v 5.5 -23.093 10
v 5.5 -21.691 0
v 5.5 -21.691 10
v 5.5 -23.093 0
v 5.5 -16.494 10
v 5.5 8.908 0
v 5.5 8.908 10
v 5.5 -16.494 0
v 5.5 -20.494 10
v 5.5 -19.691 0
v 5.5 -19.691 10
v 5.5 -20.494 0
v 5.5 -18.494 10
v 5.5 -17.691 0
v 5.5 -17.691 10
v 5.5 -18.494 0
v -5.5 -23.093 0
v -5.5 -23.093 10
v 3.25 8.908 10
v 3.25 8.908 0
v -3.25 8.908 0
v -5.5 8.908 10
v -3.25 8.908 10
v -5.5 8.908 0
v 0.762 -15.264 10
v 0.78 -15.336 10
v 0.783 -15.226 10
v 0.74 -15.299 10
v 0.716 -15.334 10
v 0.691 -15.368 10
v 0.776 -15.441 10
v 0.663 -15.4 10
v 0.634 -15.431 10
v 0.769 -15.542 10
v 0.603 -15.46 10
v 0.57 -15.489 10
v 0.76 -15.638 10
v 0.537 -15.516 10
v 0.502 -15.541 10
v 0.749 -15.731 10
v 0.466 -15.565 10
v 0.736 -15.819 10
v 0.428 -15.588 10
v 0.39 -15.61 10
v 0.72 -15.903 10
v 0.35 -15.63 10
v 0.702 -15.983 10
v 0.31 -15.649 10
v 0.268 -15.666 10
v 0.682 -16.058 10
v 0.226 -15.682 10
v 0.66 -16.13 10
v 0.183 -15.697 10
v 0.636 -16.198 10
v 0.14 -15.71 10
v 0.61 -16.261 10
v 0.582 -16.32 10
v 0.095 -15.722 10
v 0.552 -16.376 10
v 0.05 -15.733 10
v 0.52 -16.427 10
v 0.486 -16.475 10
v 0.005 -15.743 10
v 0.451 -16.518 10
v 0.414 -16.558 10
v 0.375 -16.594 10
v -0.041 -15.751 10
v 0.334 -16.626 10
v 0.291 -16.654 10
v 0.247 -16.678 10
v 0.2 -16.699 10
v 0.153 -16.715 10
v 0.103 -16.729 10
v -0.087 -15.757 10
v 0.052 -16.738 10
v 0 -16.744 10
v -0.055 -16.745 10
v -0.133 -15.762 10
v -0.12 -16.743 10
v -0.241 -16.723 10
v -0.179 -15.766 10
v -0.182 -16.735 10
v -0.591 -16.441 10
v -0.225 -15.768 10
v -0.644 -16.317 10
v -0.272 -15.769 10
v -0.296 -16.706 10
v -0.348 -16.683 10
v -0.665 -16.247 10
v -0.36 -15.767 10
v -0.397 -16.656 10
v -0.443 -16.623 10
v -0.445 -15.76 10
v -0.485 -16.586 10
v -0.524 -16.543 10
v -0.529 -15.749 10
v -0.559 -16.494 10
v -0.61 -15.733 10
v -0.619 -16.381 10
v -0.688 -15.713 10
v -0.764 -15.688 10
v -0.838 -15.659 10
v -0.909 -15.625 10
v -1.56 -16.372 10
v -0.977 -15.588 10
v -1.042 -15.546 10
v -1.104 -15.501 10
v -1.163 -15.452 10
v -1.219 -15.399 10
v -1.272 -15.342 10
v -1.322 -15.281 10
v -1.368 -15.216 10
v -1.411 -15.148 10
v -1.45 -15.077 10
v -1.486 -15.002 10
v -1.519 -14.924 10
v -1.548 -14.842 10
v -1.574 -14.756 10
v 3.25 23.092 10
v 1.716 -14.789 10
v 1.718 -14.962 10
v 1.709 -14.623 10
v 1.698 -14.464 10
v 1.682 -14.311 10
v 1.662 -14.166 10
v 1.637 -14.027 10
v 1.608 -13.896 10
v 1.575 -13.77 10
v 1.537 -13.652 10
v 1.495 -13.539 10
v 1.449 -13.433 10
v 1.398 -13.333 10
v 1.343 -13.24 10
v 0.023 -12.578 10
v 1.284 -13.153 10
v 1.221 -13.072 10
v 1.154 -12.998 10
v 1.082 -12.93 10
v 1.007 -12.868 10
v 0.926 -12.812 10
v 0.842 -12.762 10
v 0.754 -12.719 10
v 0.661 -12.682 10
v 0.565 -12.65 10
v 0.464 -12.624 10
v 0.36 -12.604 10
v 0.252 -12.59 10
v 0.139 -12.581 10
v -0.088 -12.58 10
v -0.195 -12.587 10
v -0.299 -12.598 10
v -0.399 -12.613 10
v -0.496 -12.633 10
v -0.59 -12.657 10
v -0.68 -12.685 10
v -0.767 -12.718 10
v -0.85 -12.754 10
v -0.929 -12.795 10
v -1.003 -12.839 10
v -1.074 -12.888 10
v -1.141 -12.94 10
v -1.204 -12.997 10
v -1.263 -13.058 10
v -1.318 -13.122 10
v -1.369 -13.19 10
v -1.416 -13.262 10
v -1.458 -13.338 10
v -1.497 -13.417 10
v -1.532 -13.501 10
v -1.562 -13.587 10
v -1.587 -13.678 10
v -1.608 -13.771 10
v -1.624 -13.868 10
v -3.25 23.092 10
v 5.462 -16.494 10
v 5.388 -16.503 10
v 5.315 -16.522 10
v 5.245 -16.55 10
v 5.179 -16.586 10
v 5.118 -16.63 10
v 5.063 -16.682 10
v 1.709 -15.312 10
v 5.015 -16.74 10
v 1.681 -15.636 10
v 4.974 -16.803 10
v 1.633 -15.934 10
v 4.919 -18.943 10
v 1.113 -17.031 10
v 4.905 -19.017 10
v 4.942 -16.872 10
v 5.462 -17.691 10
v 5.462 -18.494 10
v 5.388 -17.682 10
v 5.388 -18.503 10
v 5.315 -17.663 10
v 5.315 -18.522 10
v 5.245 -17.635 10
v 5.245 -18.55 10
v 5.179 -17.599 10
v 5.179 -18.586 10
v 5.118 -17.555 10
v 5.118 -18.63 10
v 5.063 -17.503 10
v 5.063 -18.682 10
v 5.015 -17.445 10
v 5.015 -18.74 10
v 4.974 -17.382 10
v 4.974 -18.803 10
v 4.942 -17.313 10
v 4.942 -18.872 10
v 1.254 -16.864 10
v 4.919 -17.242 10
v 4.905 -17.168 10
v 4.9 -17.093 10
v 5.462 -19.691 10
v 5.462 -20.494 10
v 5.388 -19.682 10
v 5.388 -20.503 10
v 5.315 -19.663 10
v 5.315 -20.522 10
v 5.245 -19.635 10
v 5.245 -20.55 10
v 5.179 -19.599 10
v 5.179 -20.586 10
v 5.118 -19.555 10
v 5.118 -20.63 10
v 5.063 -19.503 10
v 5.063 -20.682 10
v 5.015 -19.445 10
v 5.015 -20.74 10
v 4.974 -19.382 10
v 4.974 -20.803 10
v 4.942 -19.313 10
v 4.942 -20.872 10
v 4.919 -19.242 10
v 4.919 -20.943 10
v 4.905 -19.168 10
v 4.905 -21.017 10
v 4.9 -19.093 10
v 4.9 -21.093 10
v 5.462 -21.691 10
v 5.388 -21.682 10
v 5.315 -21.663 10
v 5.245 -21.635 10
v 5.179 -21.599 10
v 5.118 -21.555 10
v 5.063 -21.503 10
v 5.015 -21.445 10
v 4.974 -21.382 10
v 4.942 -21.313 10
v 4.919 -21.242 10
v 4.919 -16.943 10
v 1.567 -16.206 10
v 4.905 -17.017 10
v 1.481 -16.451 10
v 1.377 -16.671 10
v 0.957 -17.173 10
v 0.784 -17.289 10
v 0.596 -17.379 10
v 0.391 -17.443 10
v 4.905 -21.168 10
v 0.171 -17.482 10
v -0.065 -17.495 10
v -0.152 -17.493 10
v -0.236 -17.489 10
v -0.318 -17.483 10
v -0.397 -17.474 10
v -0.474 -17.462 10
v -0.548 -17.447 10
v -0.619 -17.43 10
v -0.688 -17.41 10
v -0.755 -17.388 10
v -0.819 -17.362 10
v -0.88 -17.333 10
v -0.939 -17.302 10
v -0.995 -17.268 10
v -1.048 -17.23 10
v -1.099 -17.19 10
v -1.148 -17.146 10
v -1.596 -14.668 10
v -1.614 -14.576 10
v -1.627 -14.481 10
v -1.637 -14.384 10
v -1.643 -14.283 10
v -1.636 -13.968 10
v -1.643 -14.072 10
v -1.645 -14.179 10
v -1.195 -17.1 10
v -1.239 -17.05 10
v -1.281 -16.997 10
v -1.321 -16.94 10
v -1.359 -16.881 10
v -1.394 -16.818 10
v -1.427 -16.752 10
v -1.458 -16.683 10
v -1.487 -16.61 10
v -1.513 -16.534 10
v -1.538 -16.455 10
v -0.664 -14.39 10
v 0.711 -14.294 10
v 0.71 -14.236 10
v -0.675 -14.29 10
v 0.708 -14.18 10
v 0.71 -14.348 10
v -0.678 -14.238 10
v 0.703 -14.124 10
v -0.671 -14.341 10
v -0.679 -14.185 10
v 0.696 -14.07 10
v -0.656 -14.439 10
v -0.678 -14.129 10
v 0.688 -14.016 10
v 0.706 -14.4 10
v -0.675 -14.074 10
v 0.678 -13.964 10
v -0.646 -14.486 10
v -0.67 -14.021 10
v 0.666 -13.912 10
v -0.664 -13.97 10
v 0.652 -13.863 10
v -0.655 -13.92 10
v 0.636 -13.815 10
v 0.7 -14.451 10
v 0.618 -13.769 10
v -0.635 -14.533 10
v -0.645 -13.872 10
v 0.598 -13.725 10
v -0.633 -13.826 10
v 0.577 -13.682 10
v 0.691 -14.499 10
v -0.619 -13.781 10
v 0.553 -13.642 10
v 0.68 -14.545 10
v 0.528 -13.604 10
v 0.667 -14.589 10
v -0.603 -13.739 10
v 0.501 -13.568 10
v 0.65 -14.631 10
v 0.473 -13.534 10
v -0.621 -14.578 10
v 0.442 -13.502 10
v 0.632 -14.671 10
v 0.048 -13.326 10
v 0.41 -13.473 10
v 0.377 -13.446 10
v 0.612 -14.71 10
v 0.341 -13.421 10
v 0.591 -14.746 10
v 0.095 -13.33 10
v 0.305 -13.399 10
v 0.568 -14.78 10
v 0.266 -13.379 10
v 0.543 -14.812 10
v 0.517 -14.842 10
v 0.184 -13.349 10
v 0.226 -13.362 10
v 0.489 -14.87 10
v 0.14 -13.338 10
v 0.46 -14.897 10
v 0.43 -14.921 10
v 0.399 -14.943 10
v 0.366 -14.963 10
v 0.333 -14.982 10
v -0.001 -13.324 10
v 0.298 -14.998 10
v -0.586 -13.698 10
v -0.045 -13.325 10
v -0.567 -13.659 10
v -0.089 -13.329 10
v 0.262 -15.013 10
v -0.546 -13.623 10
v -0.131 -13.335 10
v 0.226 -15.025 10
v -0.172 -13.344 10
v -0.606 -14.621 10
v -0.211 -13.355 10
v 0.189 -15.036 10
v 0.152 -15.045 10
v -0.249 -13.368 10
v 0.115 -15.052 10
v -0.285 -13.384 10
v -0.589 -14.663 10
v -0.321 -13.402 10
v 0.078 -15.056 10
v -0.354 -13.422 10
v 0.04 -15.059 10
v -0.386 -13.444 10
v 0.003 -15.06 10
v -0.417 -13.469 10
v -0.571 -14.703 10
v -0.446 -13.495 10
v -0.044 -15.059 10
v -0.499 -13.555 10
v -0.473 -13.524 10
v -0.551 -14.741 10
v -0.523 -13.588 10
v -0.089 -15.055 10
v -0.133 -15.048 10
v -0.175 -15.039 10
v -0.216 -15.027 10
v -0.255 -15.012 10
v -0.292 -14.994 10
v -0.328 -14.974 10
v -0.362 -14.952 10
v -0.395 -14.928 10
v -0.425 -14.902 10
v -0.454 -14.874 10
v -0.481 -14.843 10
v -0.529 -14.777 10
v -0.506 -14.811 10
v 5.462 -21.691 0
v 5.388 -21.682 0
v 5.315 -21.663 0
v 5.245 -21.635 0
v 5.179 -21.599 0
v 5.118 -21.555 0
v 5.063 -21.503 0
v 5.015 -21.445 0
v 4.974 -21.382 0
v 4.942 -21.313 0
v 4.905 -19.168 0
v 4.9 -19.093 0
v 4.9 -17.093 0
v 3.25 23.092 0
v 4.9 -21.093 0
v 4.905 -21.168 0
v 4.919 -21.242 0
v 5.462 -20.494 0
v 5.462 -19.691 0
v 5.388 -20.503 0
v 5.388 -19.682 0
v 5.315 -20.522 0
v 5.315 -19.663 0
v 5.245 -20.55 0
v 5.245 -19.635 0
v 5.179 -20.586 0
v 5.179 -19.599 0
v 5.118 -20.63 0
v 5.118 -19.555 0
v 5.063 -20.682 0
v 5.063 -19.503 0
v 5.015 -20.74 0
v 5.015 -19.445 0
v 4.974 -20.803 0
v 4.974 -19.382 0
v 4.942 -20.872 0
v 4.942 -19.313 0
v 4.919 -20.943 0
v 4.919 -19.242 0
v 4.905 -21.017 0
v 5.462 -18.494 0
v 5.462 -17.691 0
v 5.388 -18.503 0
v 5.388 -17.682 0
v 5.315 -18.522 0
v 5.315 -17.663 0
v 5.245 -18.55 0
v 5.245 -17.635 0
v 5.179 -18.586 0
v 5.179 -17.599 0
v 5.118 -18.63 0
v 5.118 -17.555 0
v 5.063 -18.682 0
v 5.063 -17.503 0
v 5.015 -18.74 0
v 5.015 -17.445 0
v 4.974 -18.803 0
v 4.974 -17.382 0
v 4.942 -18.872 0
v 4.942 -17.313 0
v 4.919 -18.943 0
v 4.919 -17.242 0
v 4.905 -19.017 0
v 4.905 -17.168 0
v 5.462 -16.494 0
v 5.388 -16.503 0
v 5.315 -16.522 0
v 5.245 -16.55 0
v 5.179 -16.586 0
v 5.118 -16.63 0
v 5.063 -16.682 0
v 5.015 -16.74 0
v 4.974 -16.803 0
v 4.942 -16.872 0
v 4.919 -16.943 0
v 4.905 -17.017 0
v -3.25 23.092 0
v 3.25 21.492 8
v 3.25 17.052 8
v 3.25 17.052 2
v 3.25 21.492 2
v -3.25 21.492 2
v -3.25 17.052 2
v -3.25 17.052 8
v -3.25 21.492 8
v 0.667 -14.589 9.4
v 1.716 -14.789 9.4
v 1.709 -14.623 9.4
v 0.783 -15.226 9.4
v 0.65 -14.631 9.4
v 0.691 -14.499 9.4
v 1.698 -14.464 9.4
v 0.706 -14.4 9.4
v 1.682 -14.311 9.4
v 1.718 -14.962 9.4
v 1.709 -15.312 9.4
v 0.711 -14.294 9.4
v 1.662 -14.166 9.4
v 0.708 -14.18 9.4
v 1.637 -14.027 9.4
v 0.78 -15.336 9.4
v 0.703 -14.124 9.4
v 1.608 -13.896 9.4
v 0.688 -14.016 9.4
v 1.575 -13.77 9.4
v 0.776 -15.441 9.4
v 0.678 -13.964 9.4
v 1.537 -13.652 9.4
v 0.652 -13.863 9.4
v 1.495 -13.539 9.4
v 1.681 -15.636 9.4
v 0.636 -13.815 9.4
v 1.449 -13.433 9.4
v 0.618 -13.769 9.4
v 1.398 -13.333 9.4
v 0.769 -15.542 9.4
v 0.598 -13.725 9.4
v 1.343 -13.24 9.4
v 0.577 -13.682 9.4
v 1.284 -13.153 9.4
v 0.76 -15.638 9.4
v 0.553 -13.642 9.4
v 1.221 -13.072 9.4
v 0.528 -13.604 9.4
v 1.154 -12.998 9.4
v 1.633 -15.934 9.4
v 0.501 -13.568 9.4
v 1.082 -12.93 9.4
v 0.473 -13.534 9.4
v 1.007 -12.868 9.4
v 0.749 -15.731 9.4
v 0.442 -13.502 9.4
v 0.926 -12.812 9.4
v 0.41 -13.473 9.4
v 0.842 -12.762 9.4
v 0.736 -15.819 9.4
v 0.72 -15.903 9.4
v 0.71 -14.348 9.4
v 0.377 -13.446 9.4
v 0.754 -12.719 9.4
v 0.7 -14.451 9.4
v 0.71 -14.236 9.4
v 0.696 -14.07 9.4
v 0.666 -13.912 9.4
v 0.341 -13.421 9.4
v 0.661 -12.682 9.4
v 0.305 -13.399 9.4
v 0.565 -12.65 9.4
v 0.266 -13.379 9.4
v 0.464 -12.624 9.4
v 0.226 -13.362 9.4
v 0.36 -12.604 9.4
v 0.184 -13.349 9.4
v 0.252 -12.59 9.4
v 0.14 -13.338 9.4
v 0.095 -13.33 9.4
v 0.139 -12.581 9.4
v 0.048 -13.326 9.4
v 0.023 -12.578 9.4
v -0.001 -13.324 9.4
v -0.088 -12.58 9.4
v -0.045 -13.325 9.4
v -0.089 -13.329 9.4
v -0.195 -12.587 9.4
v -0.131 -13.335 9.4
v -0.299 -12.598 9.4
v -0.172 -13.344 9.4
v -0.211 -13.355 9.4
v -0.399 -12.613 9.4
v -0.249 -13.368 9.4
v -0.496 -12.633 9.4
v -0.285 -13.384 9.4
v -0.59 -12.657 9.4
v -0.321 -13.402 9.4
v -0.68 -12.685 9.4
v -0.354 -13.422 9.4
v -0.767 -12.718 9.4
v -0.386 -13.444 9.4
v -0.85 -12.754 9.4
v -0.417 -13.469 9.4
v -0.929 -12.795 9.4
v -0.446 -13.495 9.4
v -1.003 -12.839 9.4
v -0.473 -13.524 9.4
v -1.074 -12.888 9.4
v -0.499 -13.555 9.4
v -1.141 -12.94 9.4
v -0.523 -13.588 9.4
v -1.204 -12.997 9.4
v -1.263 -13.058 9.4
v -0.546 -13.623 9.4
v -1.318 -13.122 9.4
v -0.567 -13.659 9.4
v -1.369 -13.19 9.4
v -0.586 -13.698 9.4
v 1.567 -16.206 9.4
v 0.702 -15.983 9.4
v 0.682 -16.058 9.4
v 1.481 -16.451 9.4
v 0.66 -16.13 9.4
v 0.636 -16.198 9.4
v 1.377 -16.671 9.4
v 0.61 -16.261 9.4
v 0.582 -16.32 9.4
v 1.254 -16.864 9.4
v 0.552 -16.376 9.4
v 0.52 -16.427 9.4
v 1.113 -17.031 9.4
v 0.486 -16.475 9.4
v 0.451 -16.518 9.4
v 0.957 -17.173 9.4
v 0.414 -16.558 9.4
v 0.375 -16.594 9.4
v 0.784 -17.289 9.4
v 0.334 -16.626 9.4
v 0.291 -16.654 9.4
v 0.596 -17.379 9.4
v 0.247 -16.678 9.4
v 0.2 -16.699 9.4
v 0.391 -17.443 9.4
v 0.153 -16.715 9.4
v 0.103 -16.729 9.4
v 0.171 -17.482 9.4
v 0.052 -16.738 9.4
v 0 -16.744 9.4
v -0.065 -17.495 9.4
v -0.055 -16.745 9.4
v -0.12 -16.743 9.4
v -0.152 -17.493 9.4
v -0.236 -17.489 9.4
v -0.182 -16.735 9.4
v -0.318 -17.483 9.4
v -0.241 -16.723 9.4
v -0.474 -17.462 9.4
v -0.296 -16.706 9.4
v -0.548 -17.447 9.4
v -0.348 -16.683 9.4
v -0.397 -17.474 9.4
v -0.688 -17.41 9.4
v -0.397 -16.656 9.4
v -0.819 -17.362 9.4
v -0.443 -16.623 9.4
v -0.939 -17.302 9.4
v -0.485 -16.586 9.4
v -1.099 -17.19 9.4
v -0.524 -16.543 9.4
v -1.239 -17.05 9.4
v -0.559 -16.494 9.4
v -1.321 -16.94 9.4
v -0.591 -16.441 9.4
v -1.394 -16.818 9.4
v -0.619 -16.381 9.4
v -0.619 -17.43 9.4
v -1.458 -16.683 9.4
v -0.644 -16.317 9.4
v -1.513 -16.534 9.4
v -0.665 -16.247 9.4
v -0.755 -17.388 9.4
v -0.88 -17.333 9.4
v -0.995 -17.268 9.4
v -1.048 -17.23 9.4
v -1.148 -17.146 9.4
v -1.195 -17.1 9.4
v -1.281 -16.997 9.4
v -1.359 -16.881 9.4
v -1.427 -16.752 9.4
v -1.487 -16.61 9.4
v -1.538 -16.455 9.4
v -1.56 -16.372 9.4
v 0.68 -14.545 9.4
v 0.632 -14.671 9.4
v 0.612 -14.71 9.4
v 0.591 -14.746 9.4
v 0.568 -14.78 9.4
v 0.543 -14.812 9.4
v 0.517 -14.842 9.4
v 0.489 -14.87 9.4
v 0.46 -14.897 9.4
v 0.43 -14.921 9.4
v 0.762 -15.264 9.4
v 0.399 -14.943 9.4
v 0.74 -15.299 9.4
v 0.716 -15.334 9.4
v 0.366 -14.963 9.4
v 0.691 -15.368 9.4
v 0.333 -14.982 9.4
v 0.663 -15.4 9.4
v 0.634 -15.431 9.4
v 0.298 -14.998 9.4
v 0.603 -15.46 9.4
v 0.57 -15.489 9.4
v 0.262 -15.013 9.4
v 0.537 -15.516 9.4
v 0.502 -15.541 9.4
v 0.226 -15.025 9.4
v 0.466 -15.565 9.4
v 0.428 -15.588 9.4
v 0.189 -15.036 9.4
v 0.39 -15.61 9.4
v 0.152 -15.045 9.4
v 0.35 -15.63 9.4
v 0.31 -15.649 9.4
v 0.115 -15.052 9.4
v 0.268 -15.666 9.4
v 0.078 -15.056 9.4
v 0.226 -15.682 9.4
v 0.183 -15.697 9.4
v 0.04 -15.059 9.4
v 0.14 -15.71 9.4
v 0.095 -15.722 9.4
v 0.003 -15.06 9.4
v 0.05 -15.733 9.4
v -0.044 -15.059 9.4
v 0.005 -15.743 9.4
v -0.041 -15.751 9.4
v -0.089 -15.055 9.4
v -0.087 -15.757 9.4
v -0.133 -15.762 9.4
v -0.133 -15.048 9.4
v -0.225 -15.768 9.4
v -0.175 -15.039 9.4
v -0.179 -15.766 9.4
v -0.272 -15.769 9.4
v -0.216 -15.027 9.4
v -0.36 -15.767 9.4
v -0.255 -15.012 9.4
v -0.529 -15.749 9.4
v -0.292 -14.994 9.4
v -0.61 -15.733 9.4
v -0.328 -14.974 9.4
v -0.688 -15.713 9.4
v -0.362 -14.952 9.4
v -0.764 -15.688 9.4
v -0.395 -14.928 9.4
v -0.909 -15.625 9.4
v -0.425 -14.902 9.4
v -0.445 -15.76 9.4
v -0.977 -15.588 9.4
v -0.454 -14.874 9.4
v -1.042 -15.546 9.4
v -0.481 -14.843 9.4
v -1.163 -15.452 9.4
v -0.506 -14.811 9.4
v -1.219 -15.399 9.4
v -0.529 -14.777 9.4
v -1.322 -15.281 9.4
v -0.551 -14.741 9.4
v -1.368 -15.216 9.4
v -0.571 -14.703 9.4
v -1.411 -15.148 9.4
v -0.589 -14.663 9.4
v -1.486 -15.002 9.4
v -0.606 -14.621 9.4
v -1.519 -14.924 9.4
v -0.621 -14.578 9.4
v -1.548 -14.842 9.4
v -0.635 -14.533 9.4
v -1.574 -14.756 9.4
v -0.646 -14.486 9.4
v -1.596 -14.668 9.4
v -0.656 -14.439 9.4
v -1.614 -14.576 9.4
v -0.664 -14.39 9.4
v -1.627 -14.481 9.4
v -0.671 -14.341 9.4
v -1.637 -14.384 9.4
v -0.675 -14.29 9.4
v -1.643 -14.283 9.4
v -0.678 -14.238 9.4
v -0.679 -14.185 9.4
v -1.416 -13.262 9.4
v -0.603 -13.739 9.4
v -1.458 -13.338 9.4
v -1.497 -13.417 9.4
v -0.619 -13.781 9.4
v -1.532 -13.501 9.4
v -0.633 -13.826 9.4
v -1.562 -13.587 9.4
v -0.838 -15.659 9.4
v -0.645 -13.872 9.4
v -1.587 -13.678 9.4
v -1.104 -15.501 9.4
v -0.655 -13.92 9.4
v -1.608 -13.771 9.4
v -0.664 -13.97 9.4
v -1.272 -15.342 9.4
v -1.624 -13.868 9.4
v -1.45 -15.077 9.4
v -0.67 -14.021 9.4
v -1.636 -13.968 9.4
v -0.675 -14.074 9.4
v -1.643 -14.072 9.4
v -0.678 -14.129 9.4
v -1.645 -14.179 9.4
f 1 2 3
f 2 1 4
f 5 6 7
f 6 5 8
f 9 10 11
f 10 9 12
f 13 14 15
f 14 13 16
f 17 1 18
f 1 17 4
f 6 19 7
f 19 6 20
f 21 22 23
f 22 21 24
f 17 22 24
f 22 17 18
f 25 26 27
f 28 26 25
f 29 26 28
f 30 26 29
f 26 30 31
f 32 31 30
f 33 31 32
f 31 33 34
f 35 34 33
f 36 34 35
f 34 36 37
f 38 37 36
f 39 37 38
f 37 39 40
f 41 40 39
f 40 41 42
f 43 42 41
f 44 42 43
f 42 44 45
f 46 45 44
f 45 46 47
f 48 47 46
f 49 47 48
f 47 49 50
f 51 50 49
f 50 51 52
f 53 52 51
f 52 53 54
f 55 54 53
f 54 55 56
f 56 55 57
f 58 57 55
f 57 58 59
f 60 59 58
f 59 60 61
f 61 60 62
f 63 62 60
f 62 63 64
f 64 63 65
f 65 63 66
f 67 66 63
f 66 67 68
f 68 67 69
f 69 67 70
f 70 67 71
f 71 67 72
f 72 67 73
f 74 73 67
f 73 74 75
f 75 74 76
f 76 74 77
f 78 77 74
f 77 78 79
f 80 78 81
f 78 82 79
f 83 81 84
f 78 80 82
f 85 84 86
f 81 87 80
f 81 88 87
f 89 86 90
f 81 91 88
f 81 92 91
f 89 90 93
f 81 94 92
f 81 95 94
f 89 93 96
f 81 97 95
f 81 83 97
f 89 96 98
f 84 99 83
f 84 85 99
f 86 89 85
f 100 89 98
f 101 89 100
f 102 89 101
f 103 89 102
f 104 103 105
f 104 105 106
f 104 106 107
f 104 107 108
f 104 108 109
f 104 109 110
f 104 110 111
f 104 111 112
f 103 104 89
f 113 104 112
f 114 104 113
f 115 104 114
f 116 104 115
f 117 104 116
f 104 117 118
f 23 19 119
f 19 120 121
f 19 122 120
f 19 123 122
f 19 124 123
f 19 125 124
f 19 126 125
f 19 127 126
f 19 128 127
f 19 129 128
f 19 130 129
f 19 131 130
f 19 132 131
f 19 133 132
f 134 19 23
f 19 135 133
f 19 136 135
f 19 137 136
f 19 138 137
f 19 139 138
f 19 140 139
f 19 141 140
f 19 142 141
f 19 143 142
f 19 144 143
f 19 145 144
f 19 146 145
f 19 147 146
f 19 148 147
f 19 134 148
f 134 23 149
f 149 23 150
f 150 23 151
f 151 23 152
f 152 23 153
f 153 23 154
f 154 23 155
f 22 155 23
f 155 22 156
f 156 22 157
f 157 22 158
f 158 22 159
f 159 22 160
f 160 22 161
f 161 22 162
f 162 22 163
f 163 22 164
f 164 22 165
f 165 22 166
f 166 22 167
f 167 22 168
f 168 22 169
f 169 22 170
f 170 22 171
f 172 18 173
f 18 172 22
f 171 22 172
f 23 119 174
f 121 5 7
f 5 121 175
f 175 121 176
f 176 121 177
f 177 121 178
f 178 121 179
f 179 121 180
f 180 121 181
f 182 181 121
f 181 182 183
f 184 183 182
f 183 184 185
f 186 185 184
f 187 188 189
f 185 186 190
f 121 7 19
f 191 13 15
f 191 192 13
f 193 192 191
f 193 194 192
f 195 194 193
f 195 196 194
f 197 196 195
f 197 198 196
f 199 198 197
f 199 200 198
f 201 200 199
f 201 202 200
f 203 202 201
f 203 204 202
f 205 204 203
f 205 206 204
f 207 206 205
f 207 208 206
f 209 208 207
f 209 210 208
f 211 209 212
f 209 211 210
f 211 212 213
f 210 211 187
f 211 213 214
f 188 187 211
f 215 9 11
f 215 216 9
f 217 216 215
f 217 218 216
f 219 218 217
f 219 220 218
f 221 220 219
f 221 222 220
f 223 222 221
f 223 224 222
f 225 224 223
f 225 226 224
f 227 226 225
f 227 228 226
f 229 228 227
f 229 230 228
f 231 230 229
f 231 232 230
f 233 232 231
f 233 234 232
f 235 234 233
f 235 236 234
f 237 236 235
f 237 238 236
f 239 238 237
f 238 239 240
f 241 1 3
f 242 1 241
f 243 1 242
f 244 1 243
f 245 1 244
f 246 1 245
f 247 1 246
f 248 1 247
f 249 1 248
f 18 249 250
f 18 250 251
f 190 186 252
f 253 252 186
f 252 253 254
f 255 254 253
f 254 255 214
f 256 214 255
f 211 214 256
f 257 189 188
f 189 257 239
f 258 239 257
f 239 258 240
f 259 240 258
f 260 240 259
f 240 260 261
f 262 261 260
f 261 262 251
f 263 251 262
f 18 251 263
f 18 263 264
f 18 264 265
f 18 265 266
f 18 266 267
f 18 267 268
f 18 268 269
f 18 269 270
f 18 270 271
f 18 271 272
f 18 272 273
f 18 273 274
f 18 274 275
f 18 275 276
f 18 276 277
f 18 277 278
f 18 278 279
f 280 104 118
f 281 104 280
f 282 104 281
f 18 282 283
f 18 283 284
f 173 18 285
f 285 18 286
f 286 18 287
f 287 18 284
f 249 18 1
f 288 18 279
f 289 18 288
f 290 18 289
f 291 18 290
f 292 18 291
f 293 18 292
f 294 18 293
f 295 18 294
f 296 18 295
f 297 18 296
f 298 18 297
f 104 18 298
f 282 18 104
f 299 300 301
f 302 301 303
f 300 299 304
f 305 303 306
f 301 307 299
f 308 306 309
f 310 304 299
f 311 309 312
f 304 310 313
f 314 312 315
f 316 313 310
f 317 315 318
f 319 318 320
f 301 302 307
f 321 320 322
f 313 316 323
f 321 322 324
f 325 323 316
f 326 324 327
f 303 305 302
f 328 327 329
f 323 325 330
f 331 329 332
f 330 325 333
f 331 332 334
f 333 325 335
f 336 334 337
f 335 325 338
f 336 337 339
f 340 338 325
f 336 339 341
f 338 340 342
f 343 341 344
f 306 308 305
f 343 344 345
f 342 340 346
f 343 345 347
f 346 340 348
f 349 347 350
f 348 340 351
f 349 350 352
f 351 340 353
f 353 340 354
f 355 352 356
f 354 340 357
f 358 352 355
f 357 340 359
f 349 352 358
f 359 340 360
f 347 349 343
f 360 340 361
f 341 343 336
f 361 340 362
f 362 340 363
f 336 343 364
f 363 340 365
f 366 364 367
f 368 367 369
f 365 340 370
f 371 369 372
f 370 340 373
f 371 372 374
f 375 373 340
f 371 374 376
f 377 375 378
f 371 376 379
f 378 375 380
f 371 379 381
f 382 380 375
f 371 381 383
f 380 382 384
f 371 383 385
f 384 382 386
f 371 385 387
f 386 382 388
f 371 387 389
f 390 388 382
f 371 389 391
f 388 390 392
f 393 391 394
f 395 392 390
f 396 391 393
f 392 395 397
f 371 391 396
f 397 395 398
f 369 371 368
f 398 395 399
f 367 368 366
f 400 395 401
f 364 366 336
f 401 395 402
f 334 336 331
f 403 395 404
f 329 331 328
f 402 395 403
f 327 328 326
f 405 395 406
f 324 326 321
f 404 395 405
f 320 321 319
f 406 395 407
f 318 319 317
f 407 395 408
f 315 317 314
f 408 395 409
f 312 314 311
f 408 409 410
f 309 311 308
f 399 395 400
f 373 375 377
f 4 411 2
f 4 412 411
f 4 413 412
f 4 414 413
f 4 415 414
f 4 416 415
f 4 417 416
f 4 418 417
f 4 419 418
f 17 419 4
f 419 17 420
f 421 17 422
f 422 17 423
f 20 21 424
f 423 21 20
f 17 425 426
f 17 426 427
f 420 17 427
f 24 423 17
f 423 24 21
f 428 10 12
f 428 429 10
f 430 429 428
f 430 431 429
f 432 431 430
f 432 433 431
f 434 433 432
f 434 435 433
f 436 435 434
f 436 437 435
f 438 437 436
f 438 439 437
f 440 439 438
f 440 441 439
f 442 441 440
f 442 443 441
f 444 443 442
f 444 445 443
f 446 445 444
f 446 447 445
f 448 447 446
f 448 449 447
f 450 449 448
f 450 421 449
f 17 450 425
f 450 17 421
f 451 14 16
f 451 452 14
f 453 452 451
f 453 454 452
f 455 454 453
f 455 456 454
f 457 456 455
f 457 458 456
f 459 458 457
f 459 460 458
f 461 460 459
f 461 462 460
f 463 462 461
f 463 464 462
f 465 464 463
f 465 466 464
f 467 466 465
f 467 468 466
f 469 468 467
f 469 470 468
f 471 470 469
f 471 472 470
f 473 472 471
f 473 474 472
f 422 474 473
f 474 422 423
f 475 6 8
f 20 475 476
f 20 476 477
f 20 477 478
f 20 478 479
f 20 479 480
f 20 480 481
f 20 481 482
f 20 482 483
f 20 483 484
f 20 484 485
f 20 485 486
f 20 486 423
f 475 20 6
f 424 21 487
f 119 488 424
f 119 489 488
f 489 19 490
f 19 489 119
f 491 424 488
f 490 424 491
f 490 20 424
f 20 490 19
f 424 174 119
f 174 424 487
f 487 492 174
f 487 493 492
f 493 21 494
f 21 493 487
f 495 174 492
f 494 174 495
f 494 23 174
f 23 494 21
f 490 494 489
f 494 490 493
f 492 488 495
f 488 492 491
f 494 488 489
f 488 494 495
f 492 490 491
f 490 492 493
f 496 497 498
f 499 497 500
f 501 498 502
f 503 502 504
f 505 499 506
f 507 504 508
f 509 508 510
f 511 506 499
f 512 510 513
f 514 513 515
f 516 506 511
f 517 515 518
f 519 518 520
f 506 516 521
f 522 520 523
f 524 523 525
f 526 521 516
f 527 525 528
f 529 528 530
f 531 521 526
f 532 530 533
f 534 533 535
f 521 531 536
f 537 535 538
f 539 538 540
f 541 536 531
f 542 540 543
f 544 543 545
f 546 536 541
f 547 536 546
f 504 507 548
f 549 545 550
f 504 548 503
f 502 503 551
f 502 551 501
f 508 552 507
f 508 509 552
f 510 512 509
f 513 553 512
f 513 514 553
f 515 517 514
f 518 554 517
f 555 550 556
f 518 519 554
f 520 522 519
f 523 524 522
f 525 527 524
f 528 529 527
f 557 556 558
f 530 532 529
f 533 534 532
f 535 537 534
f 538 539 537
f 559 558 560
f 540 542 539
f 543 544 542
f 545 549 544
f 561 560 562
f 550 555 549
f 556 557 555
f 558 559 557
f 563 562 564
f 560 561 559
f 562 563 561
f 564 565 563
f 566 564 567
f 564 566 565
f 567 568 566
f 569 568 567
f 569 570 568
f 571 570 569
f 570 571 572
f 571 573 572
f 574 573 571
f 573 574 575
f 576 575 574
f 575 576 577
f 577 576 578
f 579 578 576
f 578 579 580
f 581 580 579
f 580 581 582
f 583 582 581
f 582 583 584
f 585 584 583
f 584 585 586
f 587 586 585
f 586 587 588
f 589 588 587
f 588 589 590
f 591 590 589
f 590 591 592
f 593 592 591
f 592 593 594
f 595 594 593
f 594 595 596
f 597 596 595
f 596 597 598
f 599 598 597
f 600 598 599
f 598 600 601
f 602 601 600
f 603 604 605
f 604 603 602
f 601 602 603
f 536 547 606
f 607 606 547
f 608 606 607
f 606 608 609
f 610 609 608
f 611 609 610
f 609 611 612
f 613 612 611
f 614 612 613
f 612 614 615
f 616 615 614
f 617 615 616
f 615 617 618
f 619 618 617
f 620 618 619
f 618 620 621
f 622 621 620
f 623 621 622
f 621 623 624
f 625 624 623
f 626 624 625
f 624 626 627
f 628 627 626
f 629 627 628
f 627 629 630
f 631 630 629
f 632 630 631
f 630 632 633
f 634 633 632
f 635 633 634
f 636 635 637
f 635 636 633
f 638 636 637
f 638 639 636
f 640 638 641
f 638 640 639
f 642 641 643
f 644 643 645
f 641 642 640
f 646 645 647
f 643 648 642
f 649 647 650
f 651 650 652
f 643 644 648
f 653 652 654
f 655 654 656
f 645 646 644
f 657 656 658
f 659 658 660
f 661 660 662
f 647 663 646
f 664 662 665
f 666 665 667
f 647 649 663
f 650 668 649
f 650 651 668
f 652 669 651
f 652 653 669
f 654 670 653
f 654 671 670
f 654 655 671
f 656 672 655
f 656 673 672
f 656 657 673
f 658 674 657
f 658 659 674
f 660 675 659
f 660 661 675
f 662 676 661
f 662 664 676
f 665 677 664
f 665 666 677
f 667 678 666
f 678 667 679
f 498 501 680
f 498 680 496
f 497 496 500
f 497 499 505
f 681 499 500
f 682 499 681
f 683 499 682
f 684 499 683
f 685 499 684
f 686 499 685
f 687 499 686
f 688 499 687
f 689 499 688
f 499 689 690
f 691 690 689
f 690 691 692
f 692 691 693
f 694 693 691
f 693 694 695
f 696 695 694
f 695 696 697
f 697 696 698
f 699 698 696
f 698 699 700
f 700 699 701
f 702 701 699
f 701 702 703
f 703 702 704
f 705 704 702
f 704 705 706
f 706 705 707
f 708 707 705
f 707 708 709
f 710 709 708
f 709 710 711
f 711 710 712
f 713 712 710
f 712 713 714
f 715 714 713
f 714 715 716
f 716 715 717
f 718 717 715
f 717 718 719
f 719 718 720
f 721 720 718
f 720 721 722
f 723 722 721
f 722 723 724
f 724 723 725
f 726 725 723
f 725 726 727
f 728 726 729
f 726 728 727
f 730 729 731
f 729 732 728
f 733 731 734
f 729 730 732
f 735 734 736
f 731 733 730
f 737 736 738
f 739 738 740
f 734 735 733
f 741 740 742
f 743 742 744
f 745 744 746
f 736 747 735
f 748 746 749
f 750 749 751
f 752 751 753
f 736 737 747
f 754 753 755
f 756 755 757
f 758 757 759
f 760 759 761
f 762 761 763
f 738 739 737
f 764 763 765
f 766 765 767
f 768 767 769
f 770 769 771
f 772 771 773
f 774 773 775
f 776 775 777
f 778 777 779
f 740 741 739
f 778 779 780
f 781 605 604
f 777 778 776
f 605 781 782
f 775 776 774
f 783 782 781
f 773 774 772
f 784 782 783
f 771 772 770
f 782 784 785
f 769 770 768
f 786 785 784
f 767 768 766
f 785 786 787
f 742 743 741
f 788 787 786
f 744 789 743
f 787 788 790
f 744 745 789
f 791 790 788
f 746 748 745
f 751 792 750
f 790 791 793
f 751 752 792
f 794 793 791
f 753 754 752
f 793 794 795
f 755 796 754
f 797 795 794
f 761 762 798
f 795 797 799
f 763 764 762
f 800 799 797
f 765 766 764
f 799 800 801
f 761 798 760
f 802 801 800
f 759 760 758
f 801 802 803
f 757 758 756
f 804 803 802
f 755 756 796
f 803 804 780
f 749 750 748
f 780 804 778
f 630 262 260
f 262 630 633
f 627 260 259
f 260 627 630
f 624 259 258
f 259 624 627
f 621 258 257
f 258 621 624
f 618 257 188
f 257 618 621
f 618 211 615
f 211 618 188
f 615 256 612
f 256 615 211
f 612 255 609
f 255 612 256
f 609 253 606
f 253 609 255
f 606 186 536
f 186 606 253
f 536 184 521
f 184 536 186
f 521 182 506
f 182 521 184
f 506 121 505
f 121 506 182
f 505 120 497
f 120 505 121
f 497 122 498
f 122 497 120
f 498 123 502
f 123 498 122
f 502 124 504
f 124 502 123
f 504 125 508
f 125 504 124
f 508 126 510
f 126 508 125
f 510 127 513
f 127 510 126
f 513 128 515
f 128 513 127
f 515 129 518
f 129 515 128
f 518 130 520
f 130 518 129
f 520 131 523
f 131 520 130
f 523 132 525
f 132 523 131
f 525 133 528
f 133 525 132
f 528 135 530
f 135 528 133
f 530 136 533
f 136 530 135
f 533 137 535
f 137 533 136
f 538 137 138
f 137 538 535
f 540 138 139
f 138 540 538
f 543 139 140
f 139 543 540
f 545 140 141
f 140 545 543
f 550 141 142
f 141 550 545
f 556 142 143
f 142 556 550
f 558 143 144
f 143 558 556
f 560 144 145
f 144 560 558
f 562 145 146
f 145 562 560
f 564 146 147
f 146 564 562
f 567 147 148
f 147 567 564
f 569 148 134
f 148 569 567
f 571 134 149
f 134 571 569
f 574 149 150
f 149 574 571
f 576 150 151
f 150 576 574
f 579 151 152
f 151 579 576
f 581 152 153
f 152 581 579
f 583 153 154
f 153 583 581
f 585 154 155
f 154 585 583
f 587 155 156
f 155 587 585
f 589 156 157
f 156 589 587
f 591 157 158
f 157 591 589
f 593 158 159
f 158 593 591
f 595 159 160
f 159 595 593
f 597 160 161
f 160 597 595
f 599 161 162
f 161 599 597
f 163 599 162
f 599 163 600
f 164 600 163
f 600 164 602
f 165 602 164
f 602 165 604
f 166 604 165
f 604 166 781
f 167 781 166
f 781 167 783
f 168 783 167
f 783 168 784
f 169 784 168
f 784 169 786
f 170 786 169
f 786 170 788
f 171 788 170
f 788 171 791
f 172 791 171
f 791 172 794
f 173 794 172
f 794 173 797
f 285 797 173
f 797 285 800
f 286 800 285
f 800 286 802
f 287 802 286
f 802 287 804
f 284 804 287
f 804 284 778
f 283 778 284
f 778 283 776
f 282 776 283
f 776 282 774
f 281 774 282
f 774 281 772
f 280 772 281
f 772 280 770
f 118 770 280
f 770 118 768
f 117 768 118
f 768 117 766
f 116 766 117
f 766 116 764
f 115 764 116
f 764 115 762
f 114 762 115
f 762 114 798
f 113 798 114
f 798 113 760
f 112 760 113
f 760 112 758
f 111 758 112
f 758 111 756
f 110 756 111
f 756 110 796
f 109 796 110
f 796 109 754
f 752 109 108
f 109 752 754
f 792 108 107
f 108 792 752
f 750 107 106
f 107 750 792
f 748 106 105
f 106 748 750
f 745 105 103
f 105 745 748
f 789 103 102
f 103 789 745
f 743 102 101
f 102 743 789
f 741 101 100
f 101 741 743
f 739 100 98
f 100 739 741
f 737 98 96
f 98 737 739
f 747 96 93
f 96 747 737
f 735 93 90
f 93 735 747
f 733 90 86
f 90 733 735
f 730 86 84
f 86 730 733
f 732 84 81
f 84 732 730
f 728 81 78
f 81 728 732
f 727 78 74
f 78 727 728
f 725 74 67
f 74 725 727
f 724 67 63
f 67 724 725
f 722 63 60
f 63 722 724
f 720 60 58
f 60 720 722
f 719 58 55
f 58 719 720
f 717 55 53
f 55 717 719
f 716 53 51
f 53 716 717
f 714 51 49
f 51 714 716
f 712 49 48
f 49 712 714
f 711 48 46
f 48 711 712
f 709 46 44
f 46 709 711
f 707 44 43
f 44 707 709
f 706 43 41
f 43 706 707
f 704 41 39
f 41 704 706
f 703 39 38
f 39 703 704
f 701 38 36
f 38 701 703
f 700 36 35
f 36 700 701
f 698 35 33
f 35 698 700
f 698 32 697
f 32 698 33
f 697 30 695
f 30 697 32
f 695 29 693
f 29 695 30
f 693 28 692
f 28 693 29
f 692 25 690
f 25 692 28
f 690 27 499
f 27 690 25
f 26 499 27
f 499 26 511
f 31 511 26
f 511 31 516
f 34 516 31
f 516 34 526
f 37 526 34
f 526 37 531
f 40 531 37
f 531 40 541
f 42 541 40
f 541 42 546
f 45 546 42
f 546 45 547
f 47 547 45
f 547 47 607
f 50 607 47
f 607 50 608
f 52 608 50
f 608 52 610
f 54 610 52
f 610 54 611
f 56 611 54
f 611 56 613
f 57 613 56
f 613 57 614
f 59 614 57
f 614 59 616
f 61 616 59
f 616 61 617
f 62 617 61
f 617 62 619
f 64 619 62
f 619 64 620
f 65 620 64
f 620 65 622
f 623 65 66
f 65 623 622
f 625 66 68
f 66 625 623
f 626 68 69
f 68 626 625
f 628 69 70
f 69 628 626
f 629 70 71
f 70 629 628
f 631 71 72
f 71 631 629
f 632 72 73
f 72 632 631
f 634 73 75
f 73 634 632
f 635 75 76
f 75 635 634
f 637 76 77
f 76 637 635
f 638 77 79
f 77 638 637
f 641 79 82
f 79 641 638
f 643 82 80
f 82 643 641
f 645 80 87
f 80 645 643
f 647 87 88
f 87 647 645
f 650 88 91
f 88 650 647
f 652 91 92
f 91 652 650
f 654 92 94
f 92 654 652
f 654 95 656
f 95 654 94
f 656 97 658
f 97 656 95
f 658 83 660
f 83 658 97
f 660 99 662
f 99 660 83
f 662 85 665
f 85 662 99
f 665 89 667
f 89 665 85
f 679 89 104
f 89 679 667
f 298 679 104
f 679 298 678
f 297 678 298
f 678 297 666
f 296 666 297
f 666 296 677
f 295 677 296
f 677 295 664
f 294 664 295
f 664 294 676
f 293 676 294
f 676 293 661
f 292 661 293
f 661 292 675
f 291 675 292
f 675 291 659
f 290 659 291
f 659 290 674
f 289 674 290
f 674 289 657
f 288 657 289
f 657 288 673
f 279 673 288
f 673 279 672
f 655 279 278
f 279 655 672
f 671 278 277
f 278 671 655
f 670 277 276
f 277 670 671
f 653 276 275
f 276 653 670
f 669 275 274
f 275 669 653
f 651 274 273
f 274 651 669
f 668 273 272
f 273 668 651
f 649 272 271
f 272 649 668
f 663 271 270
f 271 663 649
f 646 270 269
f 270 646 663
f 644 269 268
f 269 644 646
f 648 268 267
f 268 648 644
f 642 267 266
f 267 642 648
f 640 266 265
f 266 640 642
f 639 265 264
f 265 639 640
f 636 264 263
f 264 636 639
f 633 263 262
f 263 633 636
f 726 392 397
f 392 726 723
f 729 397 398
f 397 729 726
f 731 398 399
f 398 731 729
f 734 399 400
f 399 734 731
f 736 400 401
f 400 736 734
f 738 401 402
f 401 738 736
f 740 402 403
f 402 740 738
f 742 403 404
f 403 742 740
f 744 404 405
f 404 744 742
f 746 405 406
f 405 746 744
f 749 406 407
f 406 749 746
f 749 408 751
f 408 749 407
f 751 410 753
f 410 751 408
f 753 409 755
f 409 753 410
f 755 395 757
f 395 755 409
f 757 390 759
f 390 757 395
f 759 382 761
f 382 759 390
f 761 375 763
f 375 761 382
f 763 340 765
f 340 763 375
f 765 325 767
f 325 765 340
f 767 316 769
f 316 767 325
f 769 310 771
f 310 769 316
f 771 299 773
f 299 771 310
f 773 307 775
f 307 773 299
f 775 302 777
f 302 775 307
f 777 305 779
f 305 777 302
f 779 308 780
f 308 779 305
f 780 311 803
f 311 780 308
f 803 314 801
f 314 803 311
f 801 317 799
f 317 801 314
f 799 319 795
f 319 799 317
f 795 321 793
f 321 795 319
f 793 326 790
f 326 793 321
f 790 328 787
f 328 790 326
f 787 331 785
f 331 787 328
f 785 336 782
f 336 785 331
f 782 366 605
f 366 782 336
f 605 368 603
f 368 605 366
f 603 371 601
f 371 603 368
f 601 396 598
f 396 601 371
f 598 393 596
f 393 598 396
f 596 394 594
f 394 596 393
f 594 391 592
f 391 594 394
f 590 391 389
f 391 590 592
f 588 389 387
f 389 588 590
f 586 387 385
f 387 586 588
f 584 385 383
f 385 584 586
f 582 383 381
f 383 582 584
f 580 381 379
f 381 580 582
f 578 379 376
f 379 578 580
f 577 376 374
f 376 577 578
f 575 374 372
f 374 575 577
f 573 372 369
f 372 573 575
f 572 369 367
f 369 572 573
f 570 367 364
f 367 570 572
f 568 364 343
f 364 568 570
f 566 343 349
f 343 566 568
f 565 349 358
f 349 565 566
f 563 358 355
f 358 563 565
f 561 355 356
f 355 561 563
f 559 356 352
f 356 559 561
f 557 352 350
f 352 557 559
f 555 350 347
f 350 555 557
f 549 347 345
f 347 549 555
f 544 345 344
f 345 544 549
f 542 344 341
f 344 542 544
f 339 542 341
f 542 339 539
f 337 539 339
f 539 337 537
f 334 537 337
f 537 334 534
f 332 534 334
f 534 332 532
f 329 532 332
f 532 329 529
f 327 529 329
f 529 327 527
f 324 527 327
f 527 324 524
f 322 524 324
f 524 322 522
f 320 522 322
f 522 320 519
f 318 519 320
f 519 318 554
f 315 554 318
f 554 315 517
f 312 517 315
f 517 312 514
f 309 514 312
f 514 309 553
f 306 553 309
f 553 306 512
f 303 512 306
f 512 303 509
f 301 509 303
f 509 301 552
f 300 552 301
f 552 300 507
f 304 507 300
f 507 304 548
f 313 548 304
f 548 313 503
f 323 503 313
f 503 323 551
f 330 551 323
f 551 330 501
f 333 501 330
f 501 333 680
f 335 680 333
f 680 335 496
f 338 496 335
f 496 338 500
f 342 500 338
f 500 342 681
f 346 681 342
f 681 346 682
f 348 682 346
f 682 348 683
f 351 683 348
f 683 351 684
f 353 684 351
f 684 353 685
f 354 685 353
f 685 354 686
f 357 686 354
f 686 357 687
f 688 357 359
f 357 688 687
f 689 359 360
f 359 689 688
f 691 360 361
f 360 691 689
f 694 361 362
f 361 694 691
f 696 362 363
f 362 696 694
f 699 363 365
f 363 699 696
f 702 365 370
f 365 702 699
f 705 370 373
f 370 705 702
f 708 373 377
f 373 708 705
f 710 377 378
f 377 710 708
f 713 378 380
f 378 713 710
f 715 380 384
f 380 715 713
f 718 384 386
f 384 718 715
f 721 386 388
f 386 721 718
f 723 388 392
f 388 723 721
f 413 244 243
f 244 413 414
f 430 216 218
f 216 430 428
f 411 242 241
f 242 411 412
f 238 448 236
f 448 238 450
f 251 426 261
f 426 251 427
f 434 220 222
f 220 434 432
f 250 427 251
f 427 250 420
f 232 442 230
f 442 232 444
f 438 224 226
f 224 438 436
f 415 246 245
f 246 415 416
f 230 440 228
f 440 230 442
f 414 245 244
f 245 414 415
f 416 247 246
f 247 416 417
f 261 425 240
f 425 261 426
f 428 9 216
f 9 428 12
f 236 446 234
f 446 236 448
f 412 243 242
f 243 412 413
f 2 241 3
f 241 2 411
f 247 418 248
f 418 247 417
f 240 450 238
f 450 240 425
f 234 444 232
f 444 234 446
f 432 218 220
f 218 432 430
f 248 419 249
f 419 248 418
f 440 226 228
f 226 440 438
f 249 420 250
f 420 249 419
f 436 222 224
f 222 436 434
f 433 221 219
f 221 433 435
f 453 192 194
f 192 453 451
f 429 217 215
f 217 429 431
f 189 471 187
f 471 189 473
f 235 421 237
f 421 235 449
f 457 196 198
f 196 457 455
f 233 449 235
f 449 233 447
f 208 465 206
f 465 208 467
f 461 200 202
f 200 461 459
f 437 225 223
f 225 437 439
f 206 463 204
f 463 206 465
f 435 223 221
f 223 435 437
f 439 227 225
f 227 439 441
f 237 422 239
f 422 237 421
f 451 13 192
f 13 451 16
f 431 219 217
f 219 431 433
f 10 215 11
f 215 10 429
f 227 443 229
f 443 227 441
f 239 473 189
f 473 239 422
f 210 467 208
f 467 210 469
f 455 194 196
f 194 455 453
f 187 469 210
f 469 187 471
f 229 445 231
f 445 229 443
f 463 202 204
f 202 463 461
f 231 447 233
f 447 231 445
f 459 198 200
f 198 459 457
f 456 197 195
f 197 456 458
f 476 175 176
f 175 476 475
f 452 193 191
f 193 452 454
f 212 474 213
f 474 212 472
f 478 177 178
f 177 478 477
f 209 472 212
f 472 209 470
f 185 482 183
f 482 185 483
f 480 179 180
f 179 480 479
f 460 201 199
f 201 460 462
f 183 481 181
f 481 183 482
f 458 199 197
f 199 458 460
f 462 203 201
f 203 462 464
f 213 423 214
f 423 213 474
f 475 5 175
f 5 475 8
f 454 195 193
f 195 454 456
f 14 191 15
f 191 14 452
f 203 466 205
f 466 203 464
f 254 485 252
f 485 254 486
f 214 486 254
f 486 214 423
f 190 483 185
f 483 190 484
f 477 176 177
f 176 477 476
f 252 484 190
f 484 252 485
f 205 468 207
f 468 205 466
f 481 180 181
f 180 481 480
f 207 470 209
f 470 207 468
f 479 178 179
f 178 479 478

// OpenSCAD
$fn = 50;

difference() {
	union() {
		translate(v = [0, 8.907499999999999, 0]) {
			rotate(a = [90, 0, 0]) {
				difference() {
					union() {
						translate(v = [-5.5, 0, 0]) {
							cube(size = [11.0, 10.0, 32.0]);
						}
						translate(v = [-3.25, 0, -14.185]) {
							cube(size = [6.5, 10.0, 14.285]);
						}
					}
					union() {
						translate(v = [-3.35, 2.0, -12.585]) {
							cube(size = [6.7, 6.0, 4.44]);
						}
						translate(v = [0, 9.4, 24.0]) {
							rotate(a = [-90, 0, 0]) {
								linear_extrude(height = 0.7) {
									text(font = "Arial:style=Bold", halign = "center", size = 5.0, text = "9", valign = "center");
								}
							}
						}
						translate(v = [5.5, 10.1, 30.0]) {
							rotate(a = [90, 0, 0]) {
								cylinder(h = 10.2, r = 0.6);
							}
						}
						translate(v = [5.5, 10.1, 28.0]) {
							rotate(a = [90, 0, 0]) {
								cylinder(h = 10.2, r = 0.6);
							}
						}
						translate(v = [5.5, 10.1, 26.0]) {
							rotate(a = [90, 0, 0]) {
								cylinder(h = 10.2, r = 0.6);
							}
						}
					}
				}
			}
		}
	}
	union();
}
